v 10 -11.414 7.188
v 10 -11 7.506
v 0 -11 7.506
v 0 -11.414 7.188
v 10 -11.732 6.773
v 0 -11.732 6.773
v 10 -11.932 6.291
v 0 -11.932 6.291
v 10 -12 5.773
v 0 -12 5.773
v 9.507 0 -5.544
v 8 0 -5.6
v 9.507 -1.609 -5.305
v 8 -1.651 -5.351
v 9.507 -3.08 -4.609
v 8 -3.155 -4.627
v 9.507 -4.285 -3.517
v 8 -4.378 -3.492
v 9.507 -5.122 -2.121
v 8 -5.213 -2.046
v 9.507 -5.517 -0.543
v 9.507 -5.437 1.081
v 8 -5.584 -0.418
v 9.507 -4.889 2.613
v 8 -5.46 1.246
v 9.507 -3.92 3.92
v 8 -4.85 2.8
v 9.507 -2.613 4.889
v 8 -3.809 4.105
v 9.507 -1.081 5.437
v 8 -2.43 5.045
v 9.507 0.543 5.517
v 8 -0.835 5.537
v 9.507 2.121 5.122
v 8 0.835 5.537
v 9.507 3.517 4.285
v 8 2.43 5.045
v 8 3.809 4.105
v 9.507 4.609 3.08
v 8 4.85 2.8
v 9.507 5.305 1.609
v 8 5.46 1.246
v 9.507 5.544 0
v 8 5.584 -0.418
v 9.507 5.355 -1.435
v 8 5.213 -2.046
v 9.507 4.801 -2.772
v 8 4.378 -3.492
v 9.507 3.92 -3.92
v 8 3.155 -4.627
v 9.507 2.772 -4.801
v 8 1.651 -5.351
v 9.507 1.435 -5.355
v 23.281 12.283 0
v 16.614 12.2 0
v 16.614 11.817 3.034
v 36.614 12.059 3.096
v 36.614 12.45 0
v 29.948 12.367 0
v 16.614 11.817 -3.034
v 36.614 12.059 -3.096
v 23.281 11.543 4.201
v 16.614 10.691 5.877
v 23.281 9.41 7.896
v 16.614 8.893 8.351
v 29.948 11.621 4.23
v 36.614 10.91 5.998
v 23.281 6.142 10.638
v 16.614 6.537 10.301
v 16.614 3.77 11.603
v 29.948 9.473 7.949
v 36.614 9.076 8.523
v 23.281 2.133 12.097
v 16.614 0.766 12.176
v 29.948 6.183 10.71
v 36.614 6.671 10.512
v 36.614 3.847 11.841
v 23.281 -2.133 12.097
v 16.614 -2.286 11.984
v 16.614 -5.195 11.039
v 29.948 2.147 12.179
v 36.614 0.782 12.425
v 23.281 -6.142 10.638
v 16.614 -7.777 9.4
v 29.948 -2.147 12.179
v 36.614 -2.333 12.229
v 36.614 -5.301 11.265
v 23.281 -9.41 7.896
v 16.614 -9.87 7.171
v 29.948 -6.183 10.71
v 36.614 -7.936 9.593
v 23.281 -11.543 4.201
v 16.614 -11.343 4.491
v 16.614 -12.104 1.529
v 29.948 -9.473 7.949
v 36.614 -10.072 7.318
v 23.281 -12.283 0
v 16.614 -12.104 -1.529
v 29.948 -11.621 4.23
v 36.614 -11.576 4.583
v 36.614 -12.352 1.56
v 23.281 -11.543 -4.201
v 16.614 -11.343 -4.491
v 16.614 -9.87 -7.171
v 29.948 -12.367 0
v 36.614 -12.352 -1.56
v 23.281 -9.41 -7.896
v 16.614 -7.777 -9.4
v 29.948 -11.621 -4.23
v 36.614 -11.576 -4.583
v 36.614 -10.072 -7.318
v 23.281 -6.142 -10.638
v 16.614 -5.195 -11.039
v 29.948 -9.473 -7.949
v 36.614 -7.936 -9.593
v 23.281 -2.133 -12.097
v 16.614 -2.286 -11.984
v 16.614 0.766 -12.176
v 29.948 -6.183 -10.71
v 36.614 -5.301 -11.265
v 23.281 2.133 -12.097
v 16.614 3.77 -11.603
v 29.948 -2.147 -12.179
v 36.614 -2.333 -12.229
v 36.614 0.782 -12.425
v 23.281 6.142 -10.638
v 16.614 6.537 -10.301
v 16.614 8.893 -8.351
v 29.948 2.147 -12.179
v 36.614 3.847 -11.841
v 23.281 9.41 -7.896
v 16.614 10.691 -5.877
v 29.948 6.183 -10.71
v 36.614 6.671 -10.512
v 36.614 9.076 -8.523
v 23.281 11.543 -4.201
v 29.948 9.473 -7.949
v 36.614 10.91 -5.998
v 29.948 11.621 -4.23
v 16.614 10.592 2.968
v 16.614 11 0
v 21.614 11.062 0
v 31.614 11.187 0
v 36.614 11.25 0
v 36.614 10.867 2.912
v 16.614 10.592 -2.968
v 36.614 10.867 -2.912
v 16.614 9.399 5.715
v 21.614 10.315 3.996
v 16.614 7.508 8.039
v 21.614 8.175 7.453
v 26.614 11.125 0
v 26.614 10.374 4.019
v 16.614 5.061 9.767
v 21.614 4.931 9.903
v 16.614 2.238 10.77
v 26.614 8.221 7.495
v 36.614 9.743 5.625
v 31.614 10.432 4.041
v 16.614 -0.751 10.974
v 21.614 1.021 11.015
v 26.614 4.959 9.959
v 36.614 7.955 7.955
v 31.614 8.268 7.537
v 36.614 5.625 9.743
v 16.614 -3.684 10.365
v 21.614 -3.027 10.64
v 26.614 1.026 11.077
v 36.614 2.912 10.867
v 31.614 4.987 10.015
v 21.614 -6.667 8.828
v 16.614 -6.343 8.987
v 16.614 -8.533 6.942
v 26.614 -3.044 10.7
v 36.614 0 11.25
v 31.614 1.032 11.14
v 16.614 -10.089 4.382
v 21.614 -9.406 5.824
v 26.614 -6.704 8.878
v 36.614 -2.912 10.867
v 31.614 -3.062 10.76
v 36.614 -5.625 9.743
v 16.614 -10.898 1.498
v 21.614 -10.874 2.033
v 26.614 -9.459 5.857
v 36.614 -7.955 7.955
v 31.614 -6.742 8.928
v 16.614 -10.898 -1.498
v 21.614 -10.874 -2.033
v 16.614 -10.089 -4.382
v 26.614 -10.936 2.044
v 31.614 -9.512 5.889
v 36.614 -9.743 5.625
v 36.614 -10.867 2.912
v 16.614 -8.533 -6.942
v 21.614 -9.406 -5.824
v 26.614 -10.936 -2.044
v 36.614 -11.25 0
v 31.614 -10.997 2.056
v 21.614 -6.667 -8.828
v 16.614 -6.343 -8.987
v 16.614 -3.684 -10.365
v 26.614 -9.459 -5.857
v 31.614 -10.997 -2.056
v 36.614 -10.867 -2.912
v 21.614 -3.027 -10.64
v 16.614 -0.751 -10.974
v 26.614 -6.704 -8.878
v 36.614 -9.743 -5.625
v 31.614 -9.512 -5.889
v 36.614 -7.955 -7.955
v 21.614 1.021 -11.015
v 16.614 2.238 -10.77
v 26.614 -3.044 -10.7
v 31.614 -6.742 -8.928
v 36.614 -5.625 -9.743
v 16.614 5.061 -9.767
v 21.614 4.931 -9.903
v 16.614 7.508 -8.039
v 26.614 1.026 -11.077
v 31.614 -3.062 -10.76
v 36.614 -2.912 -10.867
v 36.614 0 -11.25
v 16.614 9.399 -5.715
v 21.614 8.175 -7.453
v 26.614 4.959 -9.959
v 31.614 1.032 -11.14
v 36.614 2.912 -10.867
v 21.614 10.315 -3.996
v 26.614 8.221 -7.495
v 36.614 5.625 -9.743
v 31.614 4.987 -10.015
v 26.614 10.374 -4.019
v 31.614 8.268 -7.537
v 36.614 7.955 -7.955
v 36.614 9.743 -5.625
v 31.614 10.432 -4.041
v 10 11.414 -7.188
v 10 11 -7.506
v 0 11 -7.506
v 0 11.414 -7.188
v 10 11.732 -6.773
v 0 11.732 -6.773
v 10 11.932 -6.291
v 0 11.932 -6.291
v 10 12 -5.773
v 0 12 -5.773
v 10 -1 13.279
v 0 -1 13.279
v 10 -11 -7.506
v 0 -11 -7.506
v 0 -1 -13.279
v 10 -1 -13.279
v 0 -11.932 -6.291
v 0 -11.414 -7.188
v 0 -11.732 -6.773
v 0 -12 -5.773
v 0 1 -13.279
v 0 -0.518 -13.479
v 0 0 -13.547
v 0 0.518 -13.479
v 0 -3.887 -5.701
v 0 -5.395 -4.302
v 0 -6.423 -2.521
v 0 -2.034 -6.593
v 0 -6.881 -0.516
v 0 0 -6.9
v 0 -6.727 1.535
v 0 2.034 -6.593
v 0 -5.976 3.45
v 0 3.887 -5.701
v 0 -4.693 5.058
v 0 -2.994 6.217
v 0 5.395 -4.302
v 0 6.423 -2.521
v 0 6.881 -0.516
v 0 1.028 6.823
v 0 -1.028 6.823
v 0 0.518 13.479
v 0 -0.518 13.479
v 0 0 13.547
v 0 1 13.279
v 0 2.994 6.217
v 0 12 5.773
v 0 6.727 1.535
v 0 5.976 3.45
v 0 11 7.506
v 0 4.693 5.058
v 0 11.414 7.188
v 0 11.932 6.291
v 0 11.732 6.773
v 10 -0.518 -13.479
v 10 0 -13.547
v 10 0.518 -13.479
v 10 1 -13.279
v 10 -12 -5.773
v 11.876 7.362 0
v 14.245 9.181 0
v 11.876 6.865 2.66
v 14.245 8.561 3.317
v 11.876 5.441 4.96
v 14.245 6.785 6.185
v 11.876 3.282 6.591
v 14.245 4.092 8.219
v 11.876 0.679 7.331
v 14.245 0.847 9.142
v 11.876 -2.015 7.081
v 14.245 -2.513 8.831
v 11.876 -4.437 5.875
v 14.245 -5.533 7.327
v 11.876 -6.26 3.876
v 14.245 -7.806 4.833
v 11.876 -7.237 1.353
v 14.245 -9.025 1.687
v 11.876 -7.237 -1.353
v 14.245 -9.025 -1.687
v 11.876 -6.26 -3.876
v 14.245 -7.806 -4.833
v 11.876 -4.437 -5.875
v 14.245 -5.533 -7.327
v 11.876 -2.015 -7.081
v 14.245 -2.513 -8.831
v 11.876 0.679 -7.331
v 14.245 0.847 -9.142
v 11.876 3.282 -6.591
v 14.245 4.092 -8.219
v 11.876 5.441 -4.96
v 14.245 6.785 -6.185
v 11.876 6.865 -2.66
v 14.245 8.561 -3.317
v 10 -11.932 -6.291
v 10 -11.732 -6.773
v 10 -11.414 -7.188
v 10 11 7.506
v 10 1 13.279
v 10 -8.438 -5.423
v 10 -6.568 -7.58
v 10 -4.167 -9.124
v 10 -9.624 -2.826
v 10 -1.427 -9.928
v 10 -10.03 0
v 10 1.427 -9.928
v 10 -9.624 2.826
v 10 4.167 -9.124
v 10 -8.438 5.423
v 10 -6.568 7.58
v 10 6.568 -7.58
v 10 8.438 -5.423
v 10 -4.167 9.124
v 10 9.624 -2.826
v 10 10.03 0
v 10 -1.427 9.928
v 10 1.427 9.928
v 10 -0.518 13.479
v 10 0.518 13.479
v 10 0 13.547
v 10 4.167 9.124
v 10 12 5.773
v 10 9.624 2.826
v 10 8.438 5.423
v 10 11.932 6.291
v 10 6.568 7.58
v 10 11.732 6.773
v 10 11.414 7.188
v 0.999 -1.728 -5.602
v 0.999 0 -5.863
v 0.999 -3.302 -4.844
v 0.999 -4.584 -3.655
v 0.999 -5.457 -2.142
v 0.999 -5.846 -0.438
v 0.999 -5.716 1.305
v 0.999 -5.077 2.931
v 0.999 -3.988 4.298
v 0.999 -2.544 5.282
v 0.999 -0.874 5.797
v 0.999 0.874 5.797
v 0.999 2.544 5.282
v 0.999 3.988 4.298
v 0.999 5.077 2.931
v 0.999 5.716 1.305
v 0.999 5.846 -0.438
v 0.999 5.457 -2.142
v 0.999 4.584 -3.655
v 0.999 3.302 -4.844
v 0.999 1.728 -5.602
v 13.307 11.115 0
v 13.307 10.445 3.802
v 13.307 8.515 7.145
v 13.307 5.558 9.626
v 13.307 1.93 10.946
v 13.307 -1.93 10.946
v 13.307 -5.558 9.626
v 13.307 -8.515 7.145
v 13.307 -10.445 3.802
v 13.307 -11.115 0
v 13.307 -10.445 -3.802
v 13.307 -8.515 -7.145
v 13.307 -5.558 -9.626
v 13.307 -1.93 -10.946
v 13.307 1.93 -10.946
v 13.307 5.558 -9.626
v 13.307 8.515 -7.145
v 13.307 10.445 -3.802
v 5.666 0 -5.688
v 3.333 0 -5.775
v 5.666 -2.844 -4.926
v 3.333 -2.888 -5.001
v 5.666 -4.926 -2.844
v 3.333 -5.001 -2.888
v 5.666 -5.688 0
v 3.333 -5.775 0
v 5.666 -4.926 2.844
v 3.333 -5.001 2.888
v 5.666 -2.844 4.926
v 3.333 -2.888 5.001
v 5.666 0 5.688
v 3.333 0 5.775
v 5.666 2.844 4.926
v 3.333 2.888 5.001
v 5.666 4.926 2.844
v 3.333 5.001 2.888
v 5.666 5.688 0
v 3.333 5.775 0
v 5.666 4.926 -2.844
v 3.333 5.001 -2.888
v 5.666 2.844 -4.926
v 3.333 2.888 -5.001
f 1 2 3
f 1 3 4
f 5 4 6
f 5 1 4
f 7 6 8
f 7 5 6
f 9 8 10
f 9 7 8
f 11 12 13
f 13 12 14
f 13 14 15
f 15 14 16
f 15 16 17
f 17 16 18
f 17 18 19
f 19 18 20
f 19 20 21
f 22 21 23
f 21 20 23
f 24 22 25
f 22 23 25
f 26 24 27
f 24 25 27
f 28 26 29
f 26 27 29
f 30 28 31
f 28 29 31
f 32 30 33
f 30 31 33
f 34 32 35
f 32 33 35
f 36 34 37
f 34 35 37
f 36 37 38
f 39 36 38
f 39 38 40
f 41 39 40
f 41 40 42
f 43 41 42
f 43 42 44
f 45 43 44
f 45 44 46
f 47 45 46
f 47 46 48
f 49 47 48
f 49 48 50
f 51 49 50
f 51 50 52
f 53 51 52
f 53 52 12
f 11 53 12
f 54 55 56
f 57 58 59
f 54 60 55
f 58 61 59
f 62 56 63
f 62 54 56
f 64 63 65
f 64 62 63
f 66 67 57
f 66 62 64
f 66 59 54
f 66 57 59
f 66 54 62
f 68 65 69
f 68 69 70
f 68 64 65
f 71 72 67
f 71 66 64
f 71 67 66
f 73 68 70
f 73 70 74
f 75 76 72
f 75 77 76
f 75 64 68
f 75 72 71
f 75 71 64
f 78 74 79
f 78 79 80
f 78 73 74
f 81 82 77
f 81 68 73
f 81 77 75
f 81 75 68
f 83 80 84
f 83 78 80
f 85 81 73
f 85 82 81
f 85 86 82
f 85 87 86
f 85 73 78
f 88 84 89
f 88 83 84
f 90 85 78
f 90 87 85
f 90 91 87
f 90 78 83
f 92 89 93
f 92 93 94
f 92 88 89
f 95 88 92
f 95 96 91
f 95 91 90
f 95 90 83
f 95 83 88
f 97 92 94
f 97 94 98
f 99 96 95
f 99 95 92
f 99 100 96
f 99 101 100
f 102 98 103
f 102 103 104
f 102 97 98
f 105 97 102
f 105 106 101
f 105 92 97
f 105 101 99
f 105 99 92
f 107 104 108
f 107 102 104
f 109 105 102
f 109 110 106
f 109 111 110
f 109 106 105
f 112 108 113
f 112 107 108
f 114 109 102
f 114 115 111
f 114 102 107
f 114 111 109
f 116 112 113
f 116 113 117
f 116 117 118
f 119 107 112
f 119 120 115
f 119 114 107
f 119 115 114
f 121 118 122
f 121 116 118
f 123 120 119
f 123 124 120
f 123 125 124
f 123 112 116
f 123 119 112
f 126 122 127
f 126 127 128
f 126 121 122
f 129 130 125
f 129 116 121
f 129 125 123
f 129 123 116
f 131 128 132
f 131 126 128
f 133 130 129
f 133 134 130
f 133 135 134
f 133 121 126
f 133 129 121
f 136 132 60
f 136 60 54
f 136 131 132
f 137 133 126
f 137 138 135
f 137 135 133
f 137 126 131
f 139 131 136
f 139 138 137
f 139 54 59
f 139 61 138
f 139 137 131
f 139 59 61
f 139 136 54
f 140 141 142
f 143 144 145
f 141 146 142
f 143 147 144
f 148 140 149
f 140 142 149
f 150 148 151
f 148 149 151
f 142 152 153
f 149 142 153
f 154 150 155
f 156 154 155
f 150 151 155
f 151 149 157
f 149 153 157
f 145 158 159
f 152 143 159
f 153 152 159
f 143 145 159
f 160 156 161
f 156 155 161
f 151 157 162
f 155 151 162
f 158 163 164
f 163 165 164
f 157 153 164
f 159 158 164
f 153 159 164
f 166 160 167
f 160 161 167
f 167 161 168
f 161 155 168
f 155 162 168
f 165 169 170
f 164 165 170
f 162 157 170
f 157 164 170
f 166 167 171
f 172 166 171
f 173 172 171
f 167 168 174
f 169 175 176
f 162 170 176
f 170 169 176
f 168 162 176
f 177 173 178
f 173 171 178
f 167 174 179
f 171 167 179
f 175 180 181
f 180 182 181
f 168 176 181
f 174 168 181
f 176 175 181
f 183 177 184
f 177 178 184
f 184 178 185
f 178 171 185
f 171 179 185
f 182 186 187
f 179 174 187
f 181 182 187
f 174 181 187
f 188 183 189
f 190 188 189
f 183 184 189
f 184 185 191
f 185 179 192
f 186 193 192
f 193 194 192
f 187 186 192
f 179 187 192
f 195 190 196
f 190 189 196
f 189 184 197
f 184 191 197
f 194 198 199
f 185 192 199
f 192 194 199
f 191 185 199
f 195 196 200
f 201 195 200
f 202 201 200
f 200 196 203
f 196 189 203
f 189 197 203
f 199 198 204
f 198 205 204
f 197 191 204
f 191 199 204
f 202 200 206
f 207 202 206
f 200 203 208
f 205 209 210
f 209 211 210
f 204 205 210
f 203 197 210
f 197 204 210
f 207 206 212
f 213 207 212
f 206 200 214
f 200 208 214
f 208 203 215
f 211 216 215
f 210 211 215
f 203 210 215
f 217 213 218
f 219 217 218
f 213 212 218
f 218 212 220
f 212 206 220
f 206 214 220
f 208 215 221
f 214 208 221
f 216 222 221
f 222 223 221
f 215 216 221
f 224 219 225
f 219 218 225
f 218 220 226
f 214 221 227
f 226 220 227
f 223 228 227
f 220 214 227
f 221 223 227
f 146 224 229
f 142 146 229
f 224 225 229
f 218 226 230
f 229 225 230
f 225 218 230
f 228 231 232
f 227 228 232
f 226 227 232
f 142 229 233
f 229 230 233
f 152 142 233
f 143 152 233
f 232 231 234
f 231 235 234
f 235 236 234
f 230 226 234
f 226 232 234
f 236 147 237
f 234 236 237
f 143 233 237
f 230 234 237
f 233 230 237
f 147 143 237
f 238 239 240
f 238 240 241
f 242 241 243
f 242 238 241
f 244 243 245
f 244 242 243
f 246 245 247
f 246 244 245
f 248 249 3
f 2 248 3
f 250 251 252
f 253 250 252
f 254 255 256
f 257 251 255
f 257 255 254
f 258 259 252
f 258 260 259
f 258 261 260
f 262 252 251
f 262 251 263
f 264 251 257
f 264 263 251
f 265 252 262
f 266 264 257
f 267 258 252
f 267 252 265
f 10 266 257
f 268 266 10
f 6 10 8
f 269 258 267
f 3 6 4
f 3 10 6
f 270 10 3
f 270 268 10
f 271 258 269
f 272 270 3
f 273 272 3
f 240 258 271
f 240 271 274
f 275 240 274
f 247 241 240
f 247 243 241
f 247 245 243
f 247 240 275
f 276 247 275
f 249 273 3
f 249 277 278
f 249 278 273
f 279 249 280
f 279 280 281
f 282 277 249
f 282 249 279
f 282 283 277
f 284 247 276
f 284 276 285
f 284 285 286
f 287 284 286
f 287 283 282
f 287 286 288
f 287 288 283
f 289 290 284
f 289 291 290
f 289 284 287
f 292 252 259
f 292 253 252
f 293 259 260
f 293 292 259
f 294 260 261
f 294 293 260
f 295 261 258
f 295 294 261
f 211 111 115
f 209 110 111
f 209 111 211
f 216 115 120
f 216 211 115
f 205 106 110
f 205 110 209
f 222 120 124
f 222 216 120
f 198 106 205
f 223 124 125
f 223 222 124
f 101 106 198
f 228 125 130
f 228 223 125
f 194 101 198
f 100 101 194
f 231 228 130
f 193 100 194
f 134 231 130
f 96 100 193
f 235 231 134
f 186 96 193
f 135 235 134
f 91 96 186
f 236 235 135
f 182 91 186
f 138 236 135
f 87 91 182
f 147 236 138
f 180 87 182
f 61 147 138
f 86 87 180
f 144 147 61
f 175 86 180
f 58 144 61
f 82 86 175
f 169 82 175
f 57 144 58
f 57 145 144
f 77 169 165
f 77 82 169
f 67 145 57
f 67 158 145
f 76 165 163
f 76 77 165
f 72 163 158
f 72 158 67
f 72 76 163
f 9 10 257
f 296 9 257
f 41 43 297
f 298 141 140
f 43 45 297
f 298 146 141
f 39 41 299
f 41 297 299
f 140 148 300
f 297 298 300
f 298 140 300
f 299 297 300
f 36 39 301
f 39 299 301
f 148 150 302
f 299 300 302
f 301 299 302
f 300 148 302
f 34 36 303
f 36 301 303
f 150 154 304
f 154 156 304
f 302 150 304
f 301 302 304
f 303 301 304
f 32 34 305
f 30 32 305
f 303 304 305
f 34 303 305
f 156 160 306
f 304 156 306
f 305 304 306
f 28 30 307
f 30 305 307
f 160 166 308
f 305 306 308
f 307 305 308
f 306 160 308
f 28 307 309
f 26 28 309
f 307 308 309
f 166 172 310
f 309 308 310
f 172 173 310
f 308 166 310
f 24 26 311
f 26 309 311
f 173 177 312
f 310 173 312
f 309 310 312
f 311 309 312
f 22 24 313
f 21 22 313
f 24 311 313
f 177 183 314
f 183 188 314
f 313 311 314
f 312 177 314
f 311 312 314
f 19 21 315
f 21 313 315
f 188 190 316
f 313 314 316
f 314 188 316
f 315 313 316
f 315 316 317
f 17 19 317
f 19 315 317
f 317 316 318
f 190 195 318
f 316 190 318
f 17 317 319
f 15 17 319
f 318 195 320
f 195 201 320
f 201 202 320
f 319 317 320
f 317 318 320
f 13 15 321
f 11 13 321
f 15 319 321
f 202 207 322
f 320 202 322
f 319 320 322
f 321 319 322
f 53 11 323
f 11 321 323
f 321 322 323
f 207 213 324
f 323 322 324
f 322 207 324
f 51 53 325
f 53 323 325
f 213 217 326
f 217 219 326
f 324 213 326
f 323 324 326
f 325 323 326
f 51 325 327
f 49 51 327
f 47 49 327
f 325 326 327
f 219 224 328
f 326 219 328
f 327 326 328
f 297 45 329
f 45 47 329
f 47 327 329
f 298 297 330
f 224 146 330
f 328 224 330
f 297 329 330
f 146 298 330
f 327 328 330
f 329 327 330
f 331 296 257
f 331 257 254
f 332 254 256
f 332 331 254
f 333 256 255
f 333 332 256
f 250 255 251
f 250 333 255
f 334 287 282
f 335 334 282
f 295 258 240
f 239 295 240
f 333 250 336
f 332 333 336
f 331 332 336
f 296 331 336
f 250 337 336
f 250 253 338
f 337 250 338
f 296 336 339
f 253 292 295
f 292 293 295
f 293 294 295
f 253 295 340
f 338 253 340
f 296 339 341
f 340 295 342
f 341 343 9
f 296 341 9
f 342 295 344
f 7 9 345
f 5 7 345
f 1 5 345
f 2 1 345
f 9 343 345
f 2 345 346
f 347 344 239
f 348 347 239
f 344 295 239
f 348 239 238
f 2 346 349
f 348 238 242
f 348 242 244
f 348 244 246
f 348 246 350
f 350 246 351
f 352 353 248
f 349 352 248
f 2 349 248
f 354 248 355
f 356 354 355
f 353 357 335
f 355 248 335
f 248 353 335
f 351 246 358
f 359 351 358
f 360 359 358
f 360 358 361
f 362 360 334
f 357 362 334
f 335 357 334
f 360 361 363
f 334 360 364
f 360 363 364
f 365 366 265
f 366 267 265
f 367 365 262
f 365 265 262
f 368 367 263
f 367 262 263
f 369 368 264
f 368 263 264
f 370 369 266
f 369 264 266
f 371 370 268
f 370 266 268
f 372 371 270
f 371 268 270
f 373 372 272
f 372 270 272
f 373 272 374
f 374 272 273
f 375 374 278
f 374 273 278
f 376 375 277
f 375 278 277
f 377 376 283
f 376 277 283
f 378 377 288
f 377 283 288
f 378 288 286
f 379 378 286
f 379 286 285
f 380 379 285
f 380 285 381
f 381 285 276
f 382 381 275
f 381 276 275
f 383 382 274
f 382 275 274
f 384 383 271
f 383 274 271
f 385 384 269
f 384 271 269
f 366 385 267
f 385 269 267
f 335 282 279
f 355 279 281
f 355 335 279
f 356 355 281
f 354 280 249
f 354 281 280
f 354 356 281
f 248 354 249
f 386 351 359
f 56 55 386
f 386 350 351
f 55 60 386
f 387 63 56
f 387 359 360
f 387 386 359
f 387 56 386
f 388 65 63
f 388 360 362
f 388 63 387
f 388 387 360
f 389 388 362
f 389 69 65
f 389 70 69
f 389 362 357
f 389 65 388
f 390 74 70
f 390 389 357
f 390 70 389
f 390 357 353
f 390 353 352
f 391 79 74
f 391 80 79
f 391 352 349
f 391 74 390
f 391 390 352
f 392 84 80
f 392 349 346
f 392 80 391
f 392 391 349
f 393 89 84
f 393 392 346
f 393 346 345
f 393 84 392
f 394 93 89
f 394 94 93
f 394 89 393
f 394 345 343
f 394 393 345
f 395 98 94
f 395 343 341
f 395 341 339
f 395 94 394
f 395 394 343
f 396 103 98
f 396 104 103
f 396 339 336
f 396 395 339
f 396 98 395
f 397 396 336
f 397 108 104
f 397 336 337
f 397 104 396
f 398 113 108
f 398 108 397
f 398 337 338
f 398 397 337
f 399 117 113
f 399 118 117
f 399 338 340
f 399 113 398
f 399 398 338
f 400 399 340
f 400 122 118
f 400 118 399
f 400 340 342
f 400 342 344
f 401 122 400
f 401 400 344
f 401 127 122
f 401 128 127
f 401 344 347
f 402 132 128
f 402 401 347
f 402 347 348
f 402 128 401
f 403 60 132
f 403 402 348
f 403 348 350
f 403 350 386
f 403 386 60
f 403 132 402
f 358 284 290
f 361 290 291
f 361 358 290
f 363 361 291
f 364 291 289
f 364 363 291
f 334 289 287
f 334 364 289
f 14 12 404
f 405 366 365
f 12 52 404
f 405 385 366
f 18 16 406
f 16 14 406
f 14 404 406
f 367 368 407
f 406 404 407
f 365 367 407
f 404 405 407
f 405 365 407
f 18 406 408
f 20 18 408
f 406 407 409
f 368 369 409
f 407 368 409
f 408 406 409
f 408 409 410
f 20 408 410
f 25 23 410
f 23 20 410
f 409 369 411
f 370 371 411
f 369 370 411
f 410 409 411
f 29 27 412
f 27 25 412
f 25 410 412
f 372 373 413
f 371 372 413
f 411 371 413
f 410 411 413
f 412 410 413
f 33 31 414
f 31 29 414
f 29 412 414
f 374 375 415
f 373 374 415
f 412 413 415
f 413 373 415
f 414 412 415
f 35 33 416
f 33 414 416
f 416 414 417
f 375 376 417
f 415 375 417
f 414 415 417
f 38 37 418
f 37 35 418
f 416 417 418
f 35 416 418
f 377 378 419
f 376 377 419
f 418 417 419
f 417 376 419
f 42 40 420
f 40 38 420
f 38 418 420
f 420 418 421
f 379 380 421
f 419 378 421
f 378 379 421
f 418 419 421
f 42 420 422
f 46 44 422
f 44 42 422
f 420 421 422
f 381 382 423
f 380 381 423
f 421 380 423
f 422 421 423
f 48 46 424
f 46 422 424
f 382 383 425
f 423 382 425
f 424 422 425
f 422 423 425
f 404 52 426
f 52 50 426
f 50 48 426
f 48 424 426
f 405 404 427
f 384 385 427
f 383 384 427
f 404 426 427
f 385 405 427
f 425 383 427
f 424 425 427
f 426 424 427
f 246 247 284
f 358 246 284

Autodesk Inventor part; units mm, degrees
ref_plane "YZ Plane" through (0, 0, 0) normal (1, 0, 0) x (0, 1, 0)
ref_plane "XZ Plane" through (0, 0, 0) normal (0, 1, 0) x (-1, 0, 0)
ref_plane "XY Plane" through (0, 0, 0) normal (0, 0, 1) x (1, 0, 0)
sketch "Sketch1" plane through (0, 0, 0) normal (0, 0, 1) x (1, 0, 0)
  line L0 (0, 0) -> (6.6144, 0) construction
  line L1 (0, 0) -> (0, 4.75) construction
  line L2 (0, 4.75) -> (8, 4.3864)
  line L3 (6.6144, 0) -> (16.6144, 0) construction
  line L4 (16.6144, 0) -> (16.6144, 12.2) construction
  line L5 (16.6144, 0) -> (36.6144, 0) construction
  line L6 (36.6144, 0) -> (36.6144, 12.45) construction
  line L7 (36.6144, 12.45) -> (16.6144, 12.2)
  line L8 (0, 4.75) -> (0, 6.75)
  line L9 (0, 4.75) -> (2, 4.75) construction
  line L10 (0, 6.75) -> (16.6144, 12.2)
  line L11 (8, 4.3864) -> (16.6144, 11)
  line L12 (16.6144, 11) -> (36.6144, 11.2499)
  line L13 (36.6144, 11.2499) -> (36.6144, 12.45)
  line L14 (0, 0) -> (3.3, 0) construction
  line L15 (3.3, 0) -> (3.3, 4.6) construction
  dimension "d2" = 4.75
  dimension "d3" = 12.2
  dimension "d4" = 20
  dimension "d5" = 12.45
  dimension "d6" = 2
  dimension "d7" = 90
  dimension "d8" = 1.2
  dimension "d9" = 1.2
  dimension "d10" = 10
  dimension "d24" = 177.397
  dimension "d25" = 8
  dimension "d26" = 3.3
  dimension "d27" = 4.6
  dimension "d28" = 6.6144
revolve "Revolution1" add sketch "Sketch1" angle 360 about axis through (6.6144, 0, 0) along (1, 0, 0)
sketch "Sketch2" plane through (0, 0, 0) normal (-1, 0, 0) x (0, 0, 1)
  circle A0 centre (0, 0) radius 6.75 projected
  line L0 (0, -6.75) -> (0, -12.2) construction
  circle A1 centre (0, 0) radius 12.2 projected
  line L1 (1.633, -6.5495) -> (2.9514, -11.8376)
  line L2 (-1.633, -6.5495) -> (-2.9514, -11.8376)
  point P0 (-1.633, -6.5495)
  point P1 (-2.9514, -11.8376)
  dimension "d12" = 14
extrude "Extrusion1" [suppressed]
chamfer "Chamfer1" [suppressed]
pattern_circular "Circular Pattern1" [suppressed]
chamfer "Chamfer2" distance 0.7 angle 45 1 edges at (0, -4.75, 0)
sketch "Sketch3" plane through (0, 0, 0) normal (-1, 0, 0) x (0, 0, 1)
  line L0 (-6.9282, -12) -> (-13.8564, 0)
  line L1 (-13.8564, 0) -> (-6.9282, 12)
  line L2 (-6.9282, 12) -> (6.9282, 12)
  line L3 (6.9282, 12) -> (13.8564, 0)
  line L4 (13.8564, 0) -> (6.9282, -12)
  line L5 (6.9282, -12) -> (-6.9282, -12)
  circle A0 centre (0, 0) radius 6.75 projected
  point P0 (0, -12)
  dimension "d32" = 24
extrude "Extrusion2" add sketch "Sketch3" against normal blind 10
fillet "Fillet1" radius 2 6 edges at (5, 12, 6.9282) (5, 12, -6.9282) (5, 0, -13.8564) (5, -12, -6.9282) (5, -12, 6.9282) (5, 0, 13.8564)
sketch "Sketch4" plane through (0, 0, 0) normal (0, 1, 0) x (-1, 0, 0)
  line L0 (-8, 4.3864) -> (-8, -4.3864) projected
  line L1 (0, 0) -> (-8, 0)
  line L2 (-8, 0) -> (-8, -5.6) construction
  line L3 (-8, -5.6) -> (0, -5.6) construction
  line L4 (0, -5.6) -> (0, 0)
  line L5 (-8, -5.6) -> (0, -5.6) construction
  line L6 (0, -5.6) -> (0, -5.9)
  line L7 (0, -5.9) -> (-8, -5.9) construction
  line L8 (-8, -5.9) -> (-8, -5.6)
  line L9 (-8, -5.6) -> (0, -5.9)
  line L10 (-16.6144, 11) -> (-16.6144, -11) projected
  line L11 (-8, 4.3864) -> (-8, -4.3864) projected
  line L12 (-16.6144, -11) -> (-8, -4.3864) projected
  line L13 (-8, -5.6) -> (-9.5072, -5.5435)
  line L14 (-8, 0) -> (-8, -4.3864)
  line L15 (-8, -4.3864) -> (-9.5072, -5.5435)
  dimension "d33" = 5.6
  dimension "d34" = 0.3
revolve "Revolution2" cut sketch "Sketch4" angle 360 about axis through (0, 0, 0) along (1, 0, 0)
chamfer "Chamfer3" distance 1 angle 45 1 edges at (0, 0, 5.9)
equation "\"Tol\" = 0"
properties part number "PneumaticAdaptorFemale"
